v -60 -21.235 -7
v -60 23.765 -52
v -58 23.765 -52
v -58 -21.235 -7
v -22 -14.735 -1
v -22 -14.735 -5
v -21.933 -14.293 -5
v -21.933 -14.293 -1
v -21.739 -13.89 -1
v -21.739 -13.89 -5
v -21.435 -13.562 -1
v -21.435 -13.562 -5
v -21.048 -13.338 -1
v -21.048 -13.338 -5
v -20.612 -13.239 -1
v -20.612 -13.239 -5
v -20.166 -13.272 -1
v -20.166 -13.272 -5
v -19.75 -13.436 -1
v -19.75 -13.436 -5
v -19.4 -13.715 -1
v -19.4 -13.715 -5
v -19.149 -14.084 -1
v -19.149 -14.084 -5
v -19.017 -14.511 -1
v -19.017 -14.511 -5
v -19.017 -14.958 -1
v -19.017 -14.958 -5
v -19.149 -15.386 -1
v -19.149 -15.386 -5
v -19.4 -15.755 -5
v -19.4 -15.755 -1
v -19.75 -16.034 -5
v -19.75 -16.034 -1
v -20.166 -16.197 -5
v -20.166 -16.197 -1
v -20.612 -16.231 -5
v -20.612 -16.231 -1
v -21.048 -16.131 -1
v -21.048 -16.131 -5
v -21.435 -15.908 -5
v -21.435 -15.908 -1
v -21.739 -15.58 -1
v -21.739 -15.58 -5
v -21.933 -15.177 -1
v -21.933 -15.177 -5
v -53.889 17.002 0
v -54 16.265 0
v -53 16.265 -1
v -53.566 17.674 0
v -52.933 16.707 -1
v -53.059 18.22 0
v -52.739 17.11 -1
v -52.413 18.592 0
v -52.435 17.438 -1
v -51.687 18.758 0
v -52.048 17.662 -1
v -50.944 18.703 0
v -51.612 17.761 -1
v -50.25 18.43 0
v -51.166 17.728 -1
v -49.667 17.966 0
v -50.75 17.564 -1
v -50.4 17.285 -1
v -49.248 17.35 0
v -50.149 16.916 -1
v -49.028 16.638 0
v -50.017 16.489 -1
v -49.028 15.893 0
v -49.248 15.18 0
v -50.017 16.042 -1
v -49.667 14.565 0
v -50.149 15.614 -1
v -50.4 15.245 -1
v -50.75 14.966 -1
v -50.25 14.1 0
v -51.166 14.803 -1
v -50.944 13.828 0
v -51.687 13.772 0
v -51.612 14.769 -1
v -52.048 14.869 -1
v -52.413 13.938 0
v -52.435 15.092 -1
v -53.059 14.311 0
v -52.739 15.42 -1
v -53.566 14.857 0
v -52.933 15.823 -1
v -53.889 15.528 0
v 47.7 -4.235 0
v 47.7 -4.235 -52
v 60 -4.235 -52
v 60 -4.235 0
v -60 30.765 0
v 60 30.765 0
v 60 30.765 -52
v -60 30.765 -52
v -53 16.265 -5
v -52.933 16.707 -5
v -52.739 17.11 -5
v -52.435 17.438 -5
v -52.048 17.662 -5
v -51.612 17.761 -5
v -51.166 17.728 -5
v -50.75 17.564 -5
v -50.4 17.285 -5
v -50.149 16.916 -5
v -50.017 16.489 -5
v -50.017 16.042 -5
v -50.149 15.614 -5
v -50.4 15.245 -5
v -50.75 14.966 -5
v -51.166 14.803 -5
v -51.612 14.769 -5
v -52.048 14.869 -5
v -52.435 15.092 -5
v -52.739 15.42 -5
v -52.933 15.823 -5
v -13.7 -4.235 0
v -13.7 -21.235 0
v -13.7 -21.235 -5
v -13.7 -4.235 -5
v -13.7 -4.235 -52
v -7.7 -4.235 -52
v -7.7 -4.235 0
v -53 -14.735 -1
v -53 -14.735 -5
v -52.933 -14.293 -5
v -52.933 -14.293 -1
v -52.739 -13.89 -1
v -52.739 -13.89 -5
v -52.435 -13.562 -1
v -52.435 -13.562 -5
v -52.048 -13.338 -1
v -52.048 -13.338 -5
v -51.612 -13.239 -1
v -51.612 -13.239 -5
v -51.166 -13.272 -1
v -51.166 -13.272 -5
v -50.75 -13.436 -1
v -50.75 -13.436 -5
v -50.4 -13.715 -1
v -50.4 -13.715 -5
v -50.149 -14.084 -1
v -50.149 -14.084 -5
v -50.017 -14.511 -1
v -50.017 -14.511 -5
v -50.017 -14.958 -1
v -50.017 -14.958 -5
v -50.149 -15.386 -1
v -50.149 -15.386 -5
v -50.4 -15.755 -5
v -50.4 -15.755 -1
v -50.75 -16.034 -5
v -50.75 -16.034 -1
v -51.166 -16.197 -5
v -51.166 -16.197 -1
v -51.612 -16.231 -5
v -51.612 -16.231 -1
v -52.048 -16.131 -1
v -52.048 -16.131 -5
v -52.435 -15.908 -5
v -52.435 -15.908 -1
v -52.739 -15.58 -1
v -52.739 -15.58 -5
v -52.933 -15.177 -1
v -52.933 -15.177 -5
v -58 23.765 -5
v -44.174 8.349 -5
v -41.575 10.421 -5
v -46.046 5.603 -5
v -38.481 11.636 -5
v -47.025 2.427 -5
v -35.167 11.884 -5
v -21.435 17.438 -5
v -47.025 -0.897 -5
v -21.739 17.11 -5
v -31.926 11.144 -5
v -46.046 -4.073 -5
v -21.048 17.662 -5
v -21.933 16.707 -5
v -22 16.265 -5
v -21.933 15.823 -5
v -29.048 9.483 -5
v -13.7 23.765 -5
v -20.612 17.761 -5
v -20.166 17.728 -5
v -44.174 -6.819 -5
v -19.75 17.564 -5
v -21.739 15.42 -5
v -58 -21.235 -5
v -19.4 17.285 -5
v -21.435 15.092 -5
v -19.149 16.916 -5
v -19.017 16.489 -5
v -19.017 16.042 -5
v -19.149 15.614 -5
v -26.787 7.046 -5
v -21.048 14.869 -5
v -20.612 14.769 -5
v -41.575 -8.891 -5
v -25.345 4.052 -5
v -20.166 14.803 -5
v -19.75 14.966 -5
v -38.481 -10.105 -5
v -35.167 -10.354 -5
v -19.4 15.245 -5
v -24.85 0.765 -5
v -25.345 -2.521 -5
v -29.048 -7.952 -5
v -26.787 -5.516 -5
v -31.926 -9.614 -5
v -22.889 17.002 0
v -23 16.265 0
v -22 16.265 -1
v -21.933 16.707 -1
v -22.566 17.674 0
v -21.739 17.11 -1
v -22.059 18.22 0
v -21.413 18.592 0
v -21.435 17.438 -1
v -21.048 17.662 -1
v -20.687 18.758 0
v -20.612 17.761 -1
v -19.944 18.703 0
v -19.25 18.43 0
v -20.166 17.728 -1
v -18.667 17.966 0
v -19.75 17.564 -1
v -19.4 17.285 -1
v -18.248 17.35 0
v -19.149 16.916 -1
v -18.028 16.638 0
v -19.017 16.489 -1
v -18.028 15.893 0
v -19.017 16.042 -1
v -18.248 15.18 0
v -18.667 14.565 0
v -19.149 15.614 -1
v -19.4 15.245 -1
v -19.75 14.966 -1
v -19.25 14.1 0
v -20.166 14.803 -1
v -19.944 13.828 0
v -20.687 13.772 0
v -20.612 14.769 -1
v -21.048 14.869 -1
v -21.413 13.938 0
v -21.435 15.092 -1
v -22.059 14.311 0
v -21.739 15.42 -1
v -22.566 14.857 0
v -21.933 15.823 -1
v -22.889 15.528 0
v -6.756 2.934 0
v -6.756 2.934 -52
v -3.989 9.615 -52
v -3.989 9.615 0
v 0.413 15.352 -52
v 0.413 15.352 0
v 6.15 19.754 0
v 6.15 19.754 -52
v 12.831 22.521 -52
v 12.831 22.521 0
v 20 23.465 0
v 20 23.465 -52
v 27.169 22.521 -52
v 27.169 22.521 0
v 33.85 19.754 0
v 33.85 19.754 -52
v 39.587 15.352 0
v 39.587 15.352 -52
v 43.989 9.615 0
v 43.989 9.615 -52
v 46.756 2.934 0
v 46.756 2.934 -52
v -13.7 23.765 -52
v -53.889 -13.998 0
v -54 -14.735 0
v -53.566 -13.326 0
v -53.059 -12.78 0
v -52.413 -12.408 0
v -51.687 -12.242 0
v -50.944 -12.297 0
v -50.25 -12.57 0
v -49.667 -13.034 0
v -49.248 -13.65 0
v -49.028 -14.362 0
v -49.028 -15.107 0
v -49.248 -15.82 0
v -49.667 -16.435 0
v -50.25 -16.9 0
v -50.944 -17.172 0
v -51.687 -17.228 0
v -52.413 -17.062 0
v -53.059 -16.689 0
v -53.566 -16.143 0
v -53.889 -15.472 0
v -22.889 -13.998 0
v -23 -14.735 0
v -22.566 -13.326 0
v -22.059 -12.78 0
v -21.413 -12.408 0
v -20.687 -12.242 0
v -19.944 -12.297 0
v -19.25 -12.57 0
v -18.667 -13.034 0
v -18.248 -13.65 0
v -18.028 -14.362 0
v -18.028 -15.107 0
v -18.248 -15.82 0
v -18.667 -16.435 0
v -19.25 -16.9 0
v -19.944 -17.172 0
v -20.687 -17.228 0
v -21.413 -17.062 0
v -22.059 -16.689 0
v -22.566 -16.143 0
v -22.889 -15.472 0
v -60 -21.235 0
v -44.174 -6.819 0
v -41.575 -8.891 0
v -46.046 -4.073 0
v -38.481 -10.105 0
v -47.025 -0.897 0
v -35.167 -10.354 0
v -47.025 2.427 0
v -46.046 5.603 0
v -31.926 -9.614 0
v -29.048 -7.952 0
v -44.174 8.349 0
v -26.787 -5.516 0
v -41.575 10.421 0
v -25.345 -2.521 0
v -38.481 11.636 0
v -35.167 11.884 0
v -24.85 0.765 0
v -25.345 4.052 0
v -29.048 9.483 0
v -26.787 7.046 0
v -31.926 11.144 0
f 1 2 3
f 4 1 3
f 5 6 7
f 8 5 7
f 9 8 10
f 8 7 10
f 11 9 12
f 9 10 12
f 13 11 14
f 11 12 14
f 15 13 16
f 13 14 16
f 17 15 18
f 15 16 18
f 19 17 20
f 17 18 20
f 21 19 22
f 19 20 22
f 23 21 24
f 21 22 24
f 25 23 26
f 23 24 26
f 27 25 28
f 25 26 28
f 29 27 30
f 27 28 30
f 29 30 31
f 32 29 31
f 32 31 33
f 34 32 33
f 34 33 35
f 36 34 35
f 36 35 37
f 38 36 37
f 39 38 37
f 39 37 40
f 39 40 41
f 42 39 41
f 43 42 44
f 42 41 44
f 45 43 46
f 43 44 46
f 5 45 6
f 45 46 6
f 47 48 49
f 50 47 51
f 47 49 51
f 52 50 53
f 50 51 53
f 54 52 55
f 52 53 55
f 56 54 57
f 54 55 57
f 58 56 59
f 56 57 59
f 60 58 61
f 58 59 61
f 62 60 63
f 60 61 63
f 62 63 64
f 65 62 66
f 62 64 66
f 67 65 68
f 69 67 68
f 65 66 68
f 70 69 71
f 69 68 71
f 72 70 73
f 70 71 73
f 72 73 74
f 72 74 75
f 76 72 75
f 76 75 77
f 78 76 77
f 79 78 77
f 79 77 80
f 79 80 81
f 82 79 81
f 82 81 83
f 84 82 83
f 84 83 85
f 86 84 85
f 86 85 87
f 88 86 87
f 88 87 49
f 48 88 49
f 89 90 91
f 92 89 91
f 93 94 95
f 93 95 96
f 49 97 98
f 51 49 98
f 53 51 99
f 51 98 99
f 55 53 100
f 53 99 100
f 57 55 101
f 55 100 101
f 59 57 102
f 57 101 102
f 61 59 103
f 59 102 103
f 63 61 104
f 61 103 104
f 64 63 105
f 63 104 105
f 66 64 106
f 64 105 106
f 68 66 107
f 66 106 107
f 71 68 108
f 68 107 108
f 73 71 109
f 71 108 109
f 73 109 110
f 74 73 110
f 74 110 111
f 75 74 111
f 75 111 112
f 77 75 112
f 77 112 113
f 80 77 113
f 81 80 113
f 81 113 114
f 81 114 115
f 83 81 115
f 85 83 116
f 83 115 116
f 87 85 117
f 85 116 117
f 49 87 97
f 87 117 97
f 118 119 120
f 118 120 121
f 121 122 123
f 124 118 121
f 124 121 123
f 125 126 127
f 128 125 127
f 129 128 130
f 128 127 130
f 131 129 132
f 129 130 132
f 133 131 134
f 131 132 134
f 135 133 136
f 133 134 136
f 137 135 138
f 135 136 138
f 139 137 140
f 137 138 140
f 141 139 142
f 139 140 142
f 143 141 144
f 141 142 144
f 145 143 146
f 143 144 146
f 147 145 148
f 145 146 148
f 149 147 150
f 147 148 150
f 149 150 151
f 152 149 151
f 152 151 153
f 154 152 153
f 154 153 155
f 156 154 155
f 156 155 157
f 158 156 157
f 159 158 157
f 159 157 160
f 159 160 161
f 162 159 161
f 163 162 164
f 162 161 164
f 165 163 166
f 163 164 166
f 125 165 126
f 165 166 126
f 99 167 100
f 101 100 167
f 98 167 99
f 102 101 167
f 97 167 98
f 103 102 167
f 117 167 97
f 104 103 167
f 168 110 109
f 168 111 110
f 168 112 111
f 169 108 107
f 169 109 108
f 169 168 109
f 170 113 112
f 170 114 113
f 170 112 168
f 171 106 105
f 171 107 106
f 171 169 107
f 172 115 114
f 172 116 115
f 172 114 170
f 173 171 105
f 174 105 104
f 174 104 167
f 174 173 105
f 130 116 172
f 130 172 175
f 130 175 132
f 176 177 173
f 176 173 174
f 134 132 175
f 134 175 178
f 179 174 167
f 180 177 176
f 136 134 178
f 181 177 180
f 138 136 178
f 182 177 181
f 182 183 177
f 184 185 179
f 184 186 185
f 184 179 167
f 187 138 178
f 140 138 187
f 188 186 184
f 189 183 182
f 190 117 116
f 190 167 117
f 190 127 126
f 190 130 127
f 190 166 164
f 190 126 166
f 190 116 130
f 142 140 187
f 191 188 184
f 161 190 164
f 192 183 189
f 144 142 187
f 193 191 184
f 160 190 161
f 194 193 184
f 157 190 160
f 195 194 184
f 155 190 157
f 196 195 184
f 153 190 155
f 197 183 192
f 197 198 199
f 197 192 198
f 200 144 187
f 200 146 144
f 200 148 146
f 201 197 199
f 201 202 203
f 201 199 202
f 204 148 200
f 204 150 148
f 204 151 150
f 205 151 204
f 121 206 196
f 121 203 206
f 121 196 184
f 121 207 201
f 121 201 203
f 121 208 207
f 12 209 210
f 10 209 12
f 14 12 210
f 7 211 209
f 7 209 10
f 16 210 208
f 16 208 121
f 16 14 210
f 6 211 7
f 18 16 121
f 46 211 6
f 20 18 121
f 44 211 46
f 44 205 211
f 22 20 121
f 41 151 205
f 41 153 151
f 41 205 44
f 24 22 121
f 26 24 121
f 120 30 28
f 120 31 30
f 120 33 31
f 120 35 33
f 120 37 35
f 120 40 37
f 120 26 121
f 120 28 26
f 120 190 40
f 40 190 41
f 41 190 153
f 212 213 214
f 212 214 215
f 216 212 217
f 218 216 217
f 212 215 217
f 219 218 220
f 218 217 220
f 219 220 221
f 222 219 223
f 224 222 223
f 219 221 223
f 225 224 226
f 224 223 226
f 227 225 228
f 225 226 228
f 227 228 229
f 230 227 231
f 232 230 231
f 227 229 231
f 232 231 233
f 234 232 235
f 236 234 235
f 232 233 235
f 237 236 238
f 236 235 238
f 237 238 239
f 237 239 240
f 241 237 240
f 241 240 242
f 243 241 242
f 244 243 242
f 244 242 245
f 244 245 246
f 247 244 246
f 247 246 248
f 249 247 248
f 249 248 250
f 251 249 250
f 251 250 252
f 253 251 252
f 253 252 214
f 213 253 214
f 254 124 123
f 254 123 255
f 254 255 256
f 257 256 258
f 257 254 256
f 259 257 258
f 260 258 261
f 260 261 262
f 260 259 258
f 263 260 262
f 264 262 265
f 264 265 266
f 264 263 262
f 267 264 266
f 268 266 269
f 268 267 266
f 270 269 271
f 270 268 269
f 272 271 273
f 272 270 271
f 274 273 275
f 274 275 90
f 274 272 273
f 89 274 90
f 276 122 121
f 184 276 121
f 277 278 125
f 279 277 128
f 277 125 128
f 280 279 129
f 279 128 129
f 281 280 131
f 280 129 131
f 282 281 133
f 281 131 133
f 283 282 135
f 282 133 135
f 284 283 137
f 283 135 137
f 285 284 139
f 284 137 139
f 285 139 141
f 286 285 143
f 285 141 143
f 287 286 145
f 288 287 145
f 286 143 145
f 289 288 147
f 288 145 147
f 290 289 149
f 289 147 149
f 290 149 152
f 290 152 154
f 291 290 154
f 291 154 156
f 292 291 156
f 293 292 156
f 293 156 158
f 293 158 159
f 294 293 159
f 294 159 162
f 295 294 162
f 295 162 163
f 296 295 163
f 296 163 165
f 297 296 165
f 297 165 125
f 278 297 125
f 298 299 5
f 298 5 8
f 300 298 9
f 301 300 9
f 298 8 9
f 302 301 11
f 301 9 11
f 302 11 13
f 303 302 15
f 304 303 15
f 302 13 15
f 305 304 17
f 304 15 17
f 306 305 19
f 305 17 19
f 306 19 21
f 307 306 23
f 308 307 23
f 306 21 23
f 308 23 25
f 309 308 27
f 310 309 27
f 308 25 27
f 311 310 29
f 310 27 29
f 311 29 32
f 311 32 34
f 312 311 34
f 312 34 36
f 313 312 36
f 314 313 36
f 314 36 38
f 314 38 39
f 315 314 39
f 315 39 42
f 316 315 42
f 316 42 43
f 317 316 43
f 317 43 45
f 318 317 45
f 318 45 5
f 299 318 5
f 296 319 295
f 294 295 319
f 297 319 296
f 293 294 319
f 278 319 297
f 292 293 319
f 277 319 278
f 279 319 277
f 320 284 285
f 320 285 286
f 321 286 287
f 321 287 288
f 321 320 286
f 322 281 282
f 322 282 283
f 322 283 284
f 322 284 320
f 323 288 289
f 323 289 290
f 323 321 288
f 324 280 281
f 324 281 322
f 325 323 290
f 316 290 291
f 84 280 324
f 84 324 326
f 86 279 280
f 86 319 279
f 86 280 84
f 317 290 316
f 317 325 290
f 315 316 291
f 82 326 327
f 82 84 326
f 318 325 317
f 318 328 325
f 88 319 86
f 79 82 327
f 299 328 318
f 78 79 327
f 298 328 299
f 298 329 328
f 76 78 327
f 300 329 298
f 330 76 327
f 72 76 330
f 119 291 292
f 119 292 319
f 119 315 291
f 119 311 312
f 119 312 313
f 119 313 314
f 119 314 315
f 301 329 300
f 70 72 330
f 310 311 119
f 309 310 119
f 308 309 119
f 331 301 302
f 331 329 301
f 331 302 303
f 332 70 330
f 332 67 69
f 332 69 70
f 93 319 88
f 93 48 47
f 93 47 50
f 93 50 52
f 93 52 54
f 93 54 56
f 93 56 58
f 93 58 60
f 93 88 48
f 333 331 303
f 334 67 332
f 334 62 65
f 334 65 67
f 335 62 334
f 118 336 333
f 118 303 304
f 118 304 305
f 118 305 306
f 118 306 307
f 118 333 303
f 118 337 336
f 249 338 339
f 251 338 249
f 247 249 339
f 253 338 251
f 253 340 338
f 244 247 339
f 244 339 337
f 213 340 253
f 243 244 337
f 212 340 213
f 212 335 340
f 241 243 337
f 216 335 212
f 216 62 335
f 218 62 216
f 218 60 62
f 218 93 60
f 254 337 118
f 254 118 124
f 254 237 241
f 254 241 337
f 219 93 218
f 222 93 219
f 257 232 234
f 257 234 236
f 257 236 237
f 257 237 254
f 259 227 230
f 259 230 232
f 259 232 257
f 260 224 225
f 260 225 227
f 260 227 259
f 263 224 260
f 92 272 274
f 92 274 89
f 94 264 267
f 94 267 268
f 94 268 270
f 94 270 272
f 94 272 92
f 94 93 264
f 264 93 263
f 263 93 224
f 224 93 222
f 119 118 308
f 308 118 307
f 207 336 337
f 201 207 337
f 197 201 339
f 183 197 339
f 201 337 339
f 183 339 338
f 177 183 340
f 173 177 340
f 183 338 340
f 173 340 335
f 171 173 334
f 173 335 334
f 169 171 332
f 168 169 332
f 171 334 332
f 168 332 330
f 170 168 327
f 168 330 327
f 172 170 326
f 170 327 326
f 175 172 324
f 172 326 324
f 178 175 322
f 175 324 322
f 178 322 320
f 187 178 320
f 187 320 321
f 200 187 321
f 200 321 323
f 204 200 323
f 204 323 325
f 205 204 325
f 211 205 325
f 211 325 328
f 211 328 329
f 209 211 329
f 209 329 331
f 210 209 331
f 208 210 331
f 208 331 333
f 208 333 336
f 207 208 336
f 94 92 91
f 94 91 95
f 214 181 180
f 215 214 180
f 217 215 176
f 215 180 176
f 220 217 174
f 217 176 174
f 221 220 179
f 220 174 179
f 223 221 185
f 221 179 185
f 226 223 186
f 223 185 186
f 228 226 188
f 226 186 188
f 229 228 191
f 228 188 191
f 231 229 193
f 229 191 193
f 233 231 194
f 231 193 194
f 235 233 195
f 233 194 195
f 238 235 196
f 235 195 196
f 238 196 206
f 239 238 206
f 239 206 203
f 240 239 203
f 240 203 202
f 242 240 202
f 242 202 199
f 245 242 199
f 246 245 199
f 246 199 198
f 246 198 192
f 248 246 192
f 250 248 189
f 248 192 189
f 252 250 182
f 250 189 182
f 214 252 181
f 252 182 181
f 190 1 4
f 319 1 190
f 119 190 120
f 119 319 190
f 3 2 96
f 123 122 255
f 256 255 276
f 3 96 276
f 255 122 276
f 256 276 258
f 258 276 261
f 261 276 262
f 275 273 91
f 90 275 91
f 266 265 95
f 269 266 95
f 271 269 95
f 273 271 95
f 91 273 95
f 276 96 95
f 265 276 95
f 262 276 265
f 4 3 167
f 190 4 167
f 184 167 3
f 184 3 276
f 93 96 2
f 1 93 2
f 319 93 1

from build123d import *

# Parameters (mm, degrees)
F0_R           = 11.15
F1_DEPTH       = 52
F2_D           = 3
F2_CSINK_D     = 5
F2_CSINK_ANGLE = 90
F3_W           = 44.3
F3_H           = 47
F4_DEPTH       = 45
F5_SIZE        = 45


with BuildPart() as f1:
    # F0 (on Top) → F1 (new body)
    with BuildSketch(Plane.XY):
        with BuildLine():
            Line((60, -4.2347954512), (60, 30.7652045488))
            Line((60, 30.7652045488), (-60, 30.7652045488))
            Line((-60, 30.7652045488), (-60, -21.2347954512))
            Line((-60, -21.2347954512), (-13.7, -21.2347954512))
            Line((-13.7, -21.2347954512), (-13.7, -4.2347954512))
            Line((-13.7, -4.2347954512), (-7.7, -4.2347954512))
            ThreePointArc((-7.7, -4.2347954512), (20, 23.4652045488), (47.7, -4.2347954512))
            Line((47.7, -4.2347954512), (60, -4.2347954512))
        make_face()
        with Locations((-36, 0.7652045488)):
            Circle(F0_R, mode=Mode.SUBTRACT)
    extrude(amount=-F1_DEPTH)

    # F2 (through all)
    with Locations(Plane.XY):
        with Locations((-51.5, 16.2652045488), (-20.5, 16.2652045488), (-51.5, -14.7347954512), (-20.5, -14.7347954512)):
            CounterSinkHole(F2_D / 2, F2_CSINK_D / 2, counter_sink_angle=F2_CSINK_ANGLE)

    # F3 (on face) → F4 (cut)
    with BuildSketch(Plane.XZ.offset(21.2347954512)):
        with Locations((-35.85, -28.5)):
            Rectangle(F3_W, F3_H)
    extrude(amount=-F4_DEPTH, mode=Mode.SUBTRACT)

    # F5
    f5_edges = [f1.edges().sort_by_distance(p)[0] for p in [
        (-59, -21.234795, -52),
    ]]
    chamfer(f5_edges, length=F5_SIZE)


solid = f1.part
